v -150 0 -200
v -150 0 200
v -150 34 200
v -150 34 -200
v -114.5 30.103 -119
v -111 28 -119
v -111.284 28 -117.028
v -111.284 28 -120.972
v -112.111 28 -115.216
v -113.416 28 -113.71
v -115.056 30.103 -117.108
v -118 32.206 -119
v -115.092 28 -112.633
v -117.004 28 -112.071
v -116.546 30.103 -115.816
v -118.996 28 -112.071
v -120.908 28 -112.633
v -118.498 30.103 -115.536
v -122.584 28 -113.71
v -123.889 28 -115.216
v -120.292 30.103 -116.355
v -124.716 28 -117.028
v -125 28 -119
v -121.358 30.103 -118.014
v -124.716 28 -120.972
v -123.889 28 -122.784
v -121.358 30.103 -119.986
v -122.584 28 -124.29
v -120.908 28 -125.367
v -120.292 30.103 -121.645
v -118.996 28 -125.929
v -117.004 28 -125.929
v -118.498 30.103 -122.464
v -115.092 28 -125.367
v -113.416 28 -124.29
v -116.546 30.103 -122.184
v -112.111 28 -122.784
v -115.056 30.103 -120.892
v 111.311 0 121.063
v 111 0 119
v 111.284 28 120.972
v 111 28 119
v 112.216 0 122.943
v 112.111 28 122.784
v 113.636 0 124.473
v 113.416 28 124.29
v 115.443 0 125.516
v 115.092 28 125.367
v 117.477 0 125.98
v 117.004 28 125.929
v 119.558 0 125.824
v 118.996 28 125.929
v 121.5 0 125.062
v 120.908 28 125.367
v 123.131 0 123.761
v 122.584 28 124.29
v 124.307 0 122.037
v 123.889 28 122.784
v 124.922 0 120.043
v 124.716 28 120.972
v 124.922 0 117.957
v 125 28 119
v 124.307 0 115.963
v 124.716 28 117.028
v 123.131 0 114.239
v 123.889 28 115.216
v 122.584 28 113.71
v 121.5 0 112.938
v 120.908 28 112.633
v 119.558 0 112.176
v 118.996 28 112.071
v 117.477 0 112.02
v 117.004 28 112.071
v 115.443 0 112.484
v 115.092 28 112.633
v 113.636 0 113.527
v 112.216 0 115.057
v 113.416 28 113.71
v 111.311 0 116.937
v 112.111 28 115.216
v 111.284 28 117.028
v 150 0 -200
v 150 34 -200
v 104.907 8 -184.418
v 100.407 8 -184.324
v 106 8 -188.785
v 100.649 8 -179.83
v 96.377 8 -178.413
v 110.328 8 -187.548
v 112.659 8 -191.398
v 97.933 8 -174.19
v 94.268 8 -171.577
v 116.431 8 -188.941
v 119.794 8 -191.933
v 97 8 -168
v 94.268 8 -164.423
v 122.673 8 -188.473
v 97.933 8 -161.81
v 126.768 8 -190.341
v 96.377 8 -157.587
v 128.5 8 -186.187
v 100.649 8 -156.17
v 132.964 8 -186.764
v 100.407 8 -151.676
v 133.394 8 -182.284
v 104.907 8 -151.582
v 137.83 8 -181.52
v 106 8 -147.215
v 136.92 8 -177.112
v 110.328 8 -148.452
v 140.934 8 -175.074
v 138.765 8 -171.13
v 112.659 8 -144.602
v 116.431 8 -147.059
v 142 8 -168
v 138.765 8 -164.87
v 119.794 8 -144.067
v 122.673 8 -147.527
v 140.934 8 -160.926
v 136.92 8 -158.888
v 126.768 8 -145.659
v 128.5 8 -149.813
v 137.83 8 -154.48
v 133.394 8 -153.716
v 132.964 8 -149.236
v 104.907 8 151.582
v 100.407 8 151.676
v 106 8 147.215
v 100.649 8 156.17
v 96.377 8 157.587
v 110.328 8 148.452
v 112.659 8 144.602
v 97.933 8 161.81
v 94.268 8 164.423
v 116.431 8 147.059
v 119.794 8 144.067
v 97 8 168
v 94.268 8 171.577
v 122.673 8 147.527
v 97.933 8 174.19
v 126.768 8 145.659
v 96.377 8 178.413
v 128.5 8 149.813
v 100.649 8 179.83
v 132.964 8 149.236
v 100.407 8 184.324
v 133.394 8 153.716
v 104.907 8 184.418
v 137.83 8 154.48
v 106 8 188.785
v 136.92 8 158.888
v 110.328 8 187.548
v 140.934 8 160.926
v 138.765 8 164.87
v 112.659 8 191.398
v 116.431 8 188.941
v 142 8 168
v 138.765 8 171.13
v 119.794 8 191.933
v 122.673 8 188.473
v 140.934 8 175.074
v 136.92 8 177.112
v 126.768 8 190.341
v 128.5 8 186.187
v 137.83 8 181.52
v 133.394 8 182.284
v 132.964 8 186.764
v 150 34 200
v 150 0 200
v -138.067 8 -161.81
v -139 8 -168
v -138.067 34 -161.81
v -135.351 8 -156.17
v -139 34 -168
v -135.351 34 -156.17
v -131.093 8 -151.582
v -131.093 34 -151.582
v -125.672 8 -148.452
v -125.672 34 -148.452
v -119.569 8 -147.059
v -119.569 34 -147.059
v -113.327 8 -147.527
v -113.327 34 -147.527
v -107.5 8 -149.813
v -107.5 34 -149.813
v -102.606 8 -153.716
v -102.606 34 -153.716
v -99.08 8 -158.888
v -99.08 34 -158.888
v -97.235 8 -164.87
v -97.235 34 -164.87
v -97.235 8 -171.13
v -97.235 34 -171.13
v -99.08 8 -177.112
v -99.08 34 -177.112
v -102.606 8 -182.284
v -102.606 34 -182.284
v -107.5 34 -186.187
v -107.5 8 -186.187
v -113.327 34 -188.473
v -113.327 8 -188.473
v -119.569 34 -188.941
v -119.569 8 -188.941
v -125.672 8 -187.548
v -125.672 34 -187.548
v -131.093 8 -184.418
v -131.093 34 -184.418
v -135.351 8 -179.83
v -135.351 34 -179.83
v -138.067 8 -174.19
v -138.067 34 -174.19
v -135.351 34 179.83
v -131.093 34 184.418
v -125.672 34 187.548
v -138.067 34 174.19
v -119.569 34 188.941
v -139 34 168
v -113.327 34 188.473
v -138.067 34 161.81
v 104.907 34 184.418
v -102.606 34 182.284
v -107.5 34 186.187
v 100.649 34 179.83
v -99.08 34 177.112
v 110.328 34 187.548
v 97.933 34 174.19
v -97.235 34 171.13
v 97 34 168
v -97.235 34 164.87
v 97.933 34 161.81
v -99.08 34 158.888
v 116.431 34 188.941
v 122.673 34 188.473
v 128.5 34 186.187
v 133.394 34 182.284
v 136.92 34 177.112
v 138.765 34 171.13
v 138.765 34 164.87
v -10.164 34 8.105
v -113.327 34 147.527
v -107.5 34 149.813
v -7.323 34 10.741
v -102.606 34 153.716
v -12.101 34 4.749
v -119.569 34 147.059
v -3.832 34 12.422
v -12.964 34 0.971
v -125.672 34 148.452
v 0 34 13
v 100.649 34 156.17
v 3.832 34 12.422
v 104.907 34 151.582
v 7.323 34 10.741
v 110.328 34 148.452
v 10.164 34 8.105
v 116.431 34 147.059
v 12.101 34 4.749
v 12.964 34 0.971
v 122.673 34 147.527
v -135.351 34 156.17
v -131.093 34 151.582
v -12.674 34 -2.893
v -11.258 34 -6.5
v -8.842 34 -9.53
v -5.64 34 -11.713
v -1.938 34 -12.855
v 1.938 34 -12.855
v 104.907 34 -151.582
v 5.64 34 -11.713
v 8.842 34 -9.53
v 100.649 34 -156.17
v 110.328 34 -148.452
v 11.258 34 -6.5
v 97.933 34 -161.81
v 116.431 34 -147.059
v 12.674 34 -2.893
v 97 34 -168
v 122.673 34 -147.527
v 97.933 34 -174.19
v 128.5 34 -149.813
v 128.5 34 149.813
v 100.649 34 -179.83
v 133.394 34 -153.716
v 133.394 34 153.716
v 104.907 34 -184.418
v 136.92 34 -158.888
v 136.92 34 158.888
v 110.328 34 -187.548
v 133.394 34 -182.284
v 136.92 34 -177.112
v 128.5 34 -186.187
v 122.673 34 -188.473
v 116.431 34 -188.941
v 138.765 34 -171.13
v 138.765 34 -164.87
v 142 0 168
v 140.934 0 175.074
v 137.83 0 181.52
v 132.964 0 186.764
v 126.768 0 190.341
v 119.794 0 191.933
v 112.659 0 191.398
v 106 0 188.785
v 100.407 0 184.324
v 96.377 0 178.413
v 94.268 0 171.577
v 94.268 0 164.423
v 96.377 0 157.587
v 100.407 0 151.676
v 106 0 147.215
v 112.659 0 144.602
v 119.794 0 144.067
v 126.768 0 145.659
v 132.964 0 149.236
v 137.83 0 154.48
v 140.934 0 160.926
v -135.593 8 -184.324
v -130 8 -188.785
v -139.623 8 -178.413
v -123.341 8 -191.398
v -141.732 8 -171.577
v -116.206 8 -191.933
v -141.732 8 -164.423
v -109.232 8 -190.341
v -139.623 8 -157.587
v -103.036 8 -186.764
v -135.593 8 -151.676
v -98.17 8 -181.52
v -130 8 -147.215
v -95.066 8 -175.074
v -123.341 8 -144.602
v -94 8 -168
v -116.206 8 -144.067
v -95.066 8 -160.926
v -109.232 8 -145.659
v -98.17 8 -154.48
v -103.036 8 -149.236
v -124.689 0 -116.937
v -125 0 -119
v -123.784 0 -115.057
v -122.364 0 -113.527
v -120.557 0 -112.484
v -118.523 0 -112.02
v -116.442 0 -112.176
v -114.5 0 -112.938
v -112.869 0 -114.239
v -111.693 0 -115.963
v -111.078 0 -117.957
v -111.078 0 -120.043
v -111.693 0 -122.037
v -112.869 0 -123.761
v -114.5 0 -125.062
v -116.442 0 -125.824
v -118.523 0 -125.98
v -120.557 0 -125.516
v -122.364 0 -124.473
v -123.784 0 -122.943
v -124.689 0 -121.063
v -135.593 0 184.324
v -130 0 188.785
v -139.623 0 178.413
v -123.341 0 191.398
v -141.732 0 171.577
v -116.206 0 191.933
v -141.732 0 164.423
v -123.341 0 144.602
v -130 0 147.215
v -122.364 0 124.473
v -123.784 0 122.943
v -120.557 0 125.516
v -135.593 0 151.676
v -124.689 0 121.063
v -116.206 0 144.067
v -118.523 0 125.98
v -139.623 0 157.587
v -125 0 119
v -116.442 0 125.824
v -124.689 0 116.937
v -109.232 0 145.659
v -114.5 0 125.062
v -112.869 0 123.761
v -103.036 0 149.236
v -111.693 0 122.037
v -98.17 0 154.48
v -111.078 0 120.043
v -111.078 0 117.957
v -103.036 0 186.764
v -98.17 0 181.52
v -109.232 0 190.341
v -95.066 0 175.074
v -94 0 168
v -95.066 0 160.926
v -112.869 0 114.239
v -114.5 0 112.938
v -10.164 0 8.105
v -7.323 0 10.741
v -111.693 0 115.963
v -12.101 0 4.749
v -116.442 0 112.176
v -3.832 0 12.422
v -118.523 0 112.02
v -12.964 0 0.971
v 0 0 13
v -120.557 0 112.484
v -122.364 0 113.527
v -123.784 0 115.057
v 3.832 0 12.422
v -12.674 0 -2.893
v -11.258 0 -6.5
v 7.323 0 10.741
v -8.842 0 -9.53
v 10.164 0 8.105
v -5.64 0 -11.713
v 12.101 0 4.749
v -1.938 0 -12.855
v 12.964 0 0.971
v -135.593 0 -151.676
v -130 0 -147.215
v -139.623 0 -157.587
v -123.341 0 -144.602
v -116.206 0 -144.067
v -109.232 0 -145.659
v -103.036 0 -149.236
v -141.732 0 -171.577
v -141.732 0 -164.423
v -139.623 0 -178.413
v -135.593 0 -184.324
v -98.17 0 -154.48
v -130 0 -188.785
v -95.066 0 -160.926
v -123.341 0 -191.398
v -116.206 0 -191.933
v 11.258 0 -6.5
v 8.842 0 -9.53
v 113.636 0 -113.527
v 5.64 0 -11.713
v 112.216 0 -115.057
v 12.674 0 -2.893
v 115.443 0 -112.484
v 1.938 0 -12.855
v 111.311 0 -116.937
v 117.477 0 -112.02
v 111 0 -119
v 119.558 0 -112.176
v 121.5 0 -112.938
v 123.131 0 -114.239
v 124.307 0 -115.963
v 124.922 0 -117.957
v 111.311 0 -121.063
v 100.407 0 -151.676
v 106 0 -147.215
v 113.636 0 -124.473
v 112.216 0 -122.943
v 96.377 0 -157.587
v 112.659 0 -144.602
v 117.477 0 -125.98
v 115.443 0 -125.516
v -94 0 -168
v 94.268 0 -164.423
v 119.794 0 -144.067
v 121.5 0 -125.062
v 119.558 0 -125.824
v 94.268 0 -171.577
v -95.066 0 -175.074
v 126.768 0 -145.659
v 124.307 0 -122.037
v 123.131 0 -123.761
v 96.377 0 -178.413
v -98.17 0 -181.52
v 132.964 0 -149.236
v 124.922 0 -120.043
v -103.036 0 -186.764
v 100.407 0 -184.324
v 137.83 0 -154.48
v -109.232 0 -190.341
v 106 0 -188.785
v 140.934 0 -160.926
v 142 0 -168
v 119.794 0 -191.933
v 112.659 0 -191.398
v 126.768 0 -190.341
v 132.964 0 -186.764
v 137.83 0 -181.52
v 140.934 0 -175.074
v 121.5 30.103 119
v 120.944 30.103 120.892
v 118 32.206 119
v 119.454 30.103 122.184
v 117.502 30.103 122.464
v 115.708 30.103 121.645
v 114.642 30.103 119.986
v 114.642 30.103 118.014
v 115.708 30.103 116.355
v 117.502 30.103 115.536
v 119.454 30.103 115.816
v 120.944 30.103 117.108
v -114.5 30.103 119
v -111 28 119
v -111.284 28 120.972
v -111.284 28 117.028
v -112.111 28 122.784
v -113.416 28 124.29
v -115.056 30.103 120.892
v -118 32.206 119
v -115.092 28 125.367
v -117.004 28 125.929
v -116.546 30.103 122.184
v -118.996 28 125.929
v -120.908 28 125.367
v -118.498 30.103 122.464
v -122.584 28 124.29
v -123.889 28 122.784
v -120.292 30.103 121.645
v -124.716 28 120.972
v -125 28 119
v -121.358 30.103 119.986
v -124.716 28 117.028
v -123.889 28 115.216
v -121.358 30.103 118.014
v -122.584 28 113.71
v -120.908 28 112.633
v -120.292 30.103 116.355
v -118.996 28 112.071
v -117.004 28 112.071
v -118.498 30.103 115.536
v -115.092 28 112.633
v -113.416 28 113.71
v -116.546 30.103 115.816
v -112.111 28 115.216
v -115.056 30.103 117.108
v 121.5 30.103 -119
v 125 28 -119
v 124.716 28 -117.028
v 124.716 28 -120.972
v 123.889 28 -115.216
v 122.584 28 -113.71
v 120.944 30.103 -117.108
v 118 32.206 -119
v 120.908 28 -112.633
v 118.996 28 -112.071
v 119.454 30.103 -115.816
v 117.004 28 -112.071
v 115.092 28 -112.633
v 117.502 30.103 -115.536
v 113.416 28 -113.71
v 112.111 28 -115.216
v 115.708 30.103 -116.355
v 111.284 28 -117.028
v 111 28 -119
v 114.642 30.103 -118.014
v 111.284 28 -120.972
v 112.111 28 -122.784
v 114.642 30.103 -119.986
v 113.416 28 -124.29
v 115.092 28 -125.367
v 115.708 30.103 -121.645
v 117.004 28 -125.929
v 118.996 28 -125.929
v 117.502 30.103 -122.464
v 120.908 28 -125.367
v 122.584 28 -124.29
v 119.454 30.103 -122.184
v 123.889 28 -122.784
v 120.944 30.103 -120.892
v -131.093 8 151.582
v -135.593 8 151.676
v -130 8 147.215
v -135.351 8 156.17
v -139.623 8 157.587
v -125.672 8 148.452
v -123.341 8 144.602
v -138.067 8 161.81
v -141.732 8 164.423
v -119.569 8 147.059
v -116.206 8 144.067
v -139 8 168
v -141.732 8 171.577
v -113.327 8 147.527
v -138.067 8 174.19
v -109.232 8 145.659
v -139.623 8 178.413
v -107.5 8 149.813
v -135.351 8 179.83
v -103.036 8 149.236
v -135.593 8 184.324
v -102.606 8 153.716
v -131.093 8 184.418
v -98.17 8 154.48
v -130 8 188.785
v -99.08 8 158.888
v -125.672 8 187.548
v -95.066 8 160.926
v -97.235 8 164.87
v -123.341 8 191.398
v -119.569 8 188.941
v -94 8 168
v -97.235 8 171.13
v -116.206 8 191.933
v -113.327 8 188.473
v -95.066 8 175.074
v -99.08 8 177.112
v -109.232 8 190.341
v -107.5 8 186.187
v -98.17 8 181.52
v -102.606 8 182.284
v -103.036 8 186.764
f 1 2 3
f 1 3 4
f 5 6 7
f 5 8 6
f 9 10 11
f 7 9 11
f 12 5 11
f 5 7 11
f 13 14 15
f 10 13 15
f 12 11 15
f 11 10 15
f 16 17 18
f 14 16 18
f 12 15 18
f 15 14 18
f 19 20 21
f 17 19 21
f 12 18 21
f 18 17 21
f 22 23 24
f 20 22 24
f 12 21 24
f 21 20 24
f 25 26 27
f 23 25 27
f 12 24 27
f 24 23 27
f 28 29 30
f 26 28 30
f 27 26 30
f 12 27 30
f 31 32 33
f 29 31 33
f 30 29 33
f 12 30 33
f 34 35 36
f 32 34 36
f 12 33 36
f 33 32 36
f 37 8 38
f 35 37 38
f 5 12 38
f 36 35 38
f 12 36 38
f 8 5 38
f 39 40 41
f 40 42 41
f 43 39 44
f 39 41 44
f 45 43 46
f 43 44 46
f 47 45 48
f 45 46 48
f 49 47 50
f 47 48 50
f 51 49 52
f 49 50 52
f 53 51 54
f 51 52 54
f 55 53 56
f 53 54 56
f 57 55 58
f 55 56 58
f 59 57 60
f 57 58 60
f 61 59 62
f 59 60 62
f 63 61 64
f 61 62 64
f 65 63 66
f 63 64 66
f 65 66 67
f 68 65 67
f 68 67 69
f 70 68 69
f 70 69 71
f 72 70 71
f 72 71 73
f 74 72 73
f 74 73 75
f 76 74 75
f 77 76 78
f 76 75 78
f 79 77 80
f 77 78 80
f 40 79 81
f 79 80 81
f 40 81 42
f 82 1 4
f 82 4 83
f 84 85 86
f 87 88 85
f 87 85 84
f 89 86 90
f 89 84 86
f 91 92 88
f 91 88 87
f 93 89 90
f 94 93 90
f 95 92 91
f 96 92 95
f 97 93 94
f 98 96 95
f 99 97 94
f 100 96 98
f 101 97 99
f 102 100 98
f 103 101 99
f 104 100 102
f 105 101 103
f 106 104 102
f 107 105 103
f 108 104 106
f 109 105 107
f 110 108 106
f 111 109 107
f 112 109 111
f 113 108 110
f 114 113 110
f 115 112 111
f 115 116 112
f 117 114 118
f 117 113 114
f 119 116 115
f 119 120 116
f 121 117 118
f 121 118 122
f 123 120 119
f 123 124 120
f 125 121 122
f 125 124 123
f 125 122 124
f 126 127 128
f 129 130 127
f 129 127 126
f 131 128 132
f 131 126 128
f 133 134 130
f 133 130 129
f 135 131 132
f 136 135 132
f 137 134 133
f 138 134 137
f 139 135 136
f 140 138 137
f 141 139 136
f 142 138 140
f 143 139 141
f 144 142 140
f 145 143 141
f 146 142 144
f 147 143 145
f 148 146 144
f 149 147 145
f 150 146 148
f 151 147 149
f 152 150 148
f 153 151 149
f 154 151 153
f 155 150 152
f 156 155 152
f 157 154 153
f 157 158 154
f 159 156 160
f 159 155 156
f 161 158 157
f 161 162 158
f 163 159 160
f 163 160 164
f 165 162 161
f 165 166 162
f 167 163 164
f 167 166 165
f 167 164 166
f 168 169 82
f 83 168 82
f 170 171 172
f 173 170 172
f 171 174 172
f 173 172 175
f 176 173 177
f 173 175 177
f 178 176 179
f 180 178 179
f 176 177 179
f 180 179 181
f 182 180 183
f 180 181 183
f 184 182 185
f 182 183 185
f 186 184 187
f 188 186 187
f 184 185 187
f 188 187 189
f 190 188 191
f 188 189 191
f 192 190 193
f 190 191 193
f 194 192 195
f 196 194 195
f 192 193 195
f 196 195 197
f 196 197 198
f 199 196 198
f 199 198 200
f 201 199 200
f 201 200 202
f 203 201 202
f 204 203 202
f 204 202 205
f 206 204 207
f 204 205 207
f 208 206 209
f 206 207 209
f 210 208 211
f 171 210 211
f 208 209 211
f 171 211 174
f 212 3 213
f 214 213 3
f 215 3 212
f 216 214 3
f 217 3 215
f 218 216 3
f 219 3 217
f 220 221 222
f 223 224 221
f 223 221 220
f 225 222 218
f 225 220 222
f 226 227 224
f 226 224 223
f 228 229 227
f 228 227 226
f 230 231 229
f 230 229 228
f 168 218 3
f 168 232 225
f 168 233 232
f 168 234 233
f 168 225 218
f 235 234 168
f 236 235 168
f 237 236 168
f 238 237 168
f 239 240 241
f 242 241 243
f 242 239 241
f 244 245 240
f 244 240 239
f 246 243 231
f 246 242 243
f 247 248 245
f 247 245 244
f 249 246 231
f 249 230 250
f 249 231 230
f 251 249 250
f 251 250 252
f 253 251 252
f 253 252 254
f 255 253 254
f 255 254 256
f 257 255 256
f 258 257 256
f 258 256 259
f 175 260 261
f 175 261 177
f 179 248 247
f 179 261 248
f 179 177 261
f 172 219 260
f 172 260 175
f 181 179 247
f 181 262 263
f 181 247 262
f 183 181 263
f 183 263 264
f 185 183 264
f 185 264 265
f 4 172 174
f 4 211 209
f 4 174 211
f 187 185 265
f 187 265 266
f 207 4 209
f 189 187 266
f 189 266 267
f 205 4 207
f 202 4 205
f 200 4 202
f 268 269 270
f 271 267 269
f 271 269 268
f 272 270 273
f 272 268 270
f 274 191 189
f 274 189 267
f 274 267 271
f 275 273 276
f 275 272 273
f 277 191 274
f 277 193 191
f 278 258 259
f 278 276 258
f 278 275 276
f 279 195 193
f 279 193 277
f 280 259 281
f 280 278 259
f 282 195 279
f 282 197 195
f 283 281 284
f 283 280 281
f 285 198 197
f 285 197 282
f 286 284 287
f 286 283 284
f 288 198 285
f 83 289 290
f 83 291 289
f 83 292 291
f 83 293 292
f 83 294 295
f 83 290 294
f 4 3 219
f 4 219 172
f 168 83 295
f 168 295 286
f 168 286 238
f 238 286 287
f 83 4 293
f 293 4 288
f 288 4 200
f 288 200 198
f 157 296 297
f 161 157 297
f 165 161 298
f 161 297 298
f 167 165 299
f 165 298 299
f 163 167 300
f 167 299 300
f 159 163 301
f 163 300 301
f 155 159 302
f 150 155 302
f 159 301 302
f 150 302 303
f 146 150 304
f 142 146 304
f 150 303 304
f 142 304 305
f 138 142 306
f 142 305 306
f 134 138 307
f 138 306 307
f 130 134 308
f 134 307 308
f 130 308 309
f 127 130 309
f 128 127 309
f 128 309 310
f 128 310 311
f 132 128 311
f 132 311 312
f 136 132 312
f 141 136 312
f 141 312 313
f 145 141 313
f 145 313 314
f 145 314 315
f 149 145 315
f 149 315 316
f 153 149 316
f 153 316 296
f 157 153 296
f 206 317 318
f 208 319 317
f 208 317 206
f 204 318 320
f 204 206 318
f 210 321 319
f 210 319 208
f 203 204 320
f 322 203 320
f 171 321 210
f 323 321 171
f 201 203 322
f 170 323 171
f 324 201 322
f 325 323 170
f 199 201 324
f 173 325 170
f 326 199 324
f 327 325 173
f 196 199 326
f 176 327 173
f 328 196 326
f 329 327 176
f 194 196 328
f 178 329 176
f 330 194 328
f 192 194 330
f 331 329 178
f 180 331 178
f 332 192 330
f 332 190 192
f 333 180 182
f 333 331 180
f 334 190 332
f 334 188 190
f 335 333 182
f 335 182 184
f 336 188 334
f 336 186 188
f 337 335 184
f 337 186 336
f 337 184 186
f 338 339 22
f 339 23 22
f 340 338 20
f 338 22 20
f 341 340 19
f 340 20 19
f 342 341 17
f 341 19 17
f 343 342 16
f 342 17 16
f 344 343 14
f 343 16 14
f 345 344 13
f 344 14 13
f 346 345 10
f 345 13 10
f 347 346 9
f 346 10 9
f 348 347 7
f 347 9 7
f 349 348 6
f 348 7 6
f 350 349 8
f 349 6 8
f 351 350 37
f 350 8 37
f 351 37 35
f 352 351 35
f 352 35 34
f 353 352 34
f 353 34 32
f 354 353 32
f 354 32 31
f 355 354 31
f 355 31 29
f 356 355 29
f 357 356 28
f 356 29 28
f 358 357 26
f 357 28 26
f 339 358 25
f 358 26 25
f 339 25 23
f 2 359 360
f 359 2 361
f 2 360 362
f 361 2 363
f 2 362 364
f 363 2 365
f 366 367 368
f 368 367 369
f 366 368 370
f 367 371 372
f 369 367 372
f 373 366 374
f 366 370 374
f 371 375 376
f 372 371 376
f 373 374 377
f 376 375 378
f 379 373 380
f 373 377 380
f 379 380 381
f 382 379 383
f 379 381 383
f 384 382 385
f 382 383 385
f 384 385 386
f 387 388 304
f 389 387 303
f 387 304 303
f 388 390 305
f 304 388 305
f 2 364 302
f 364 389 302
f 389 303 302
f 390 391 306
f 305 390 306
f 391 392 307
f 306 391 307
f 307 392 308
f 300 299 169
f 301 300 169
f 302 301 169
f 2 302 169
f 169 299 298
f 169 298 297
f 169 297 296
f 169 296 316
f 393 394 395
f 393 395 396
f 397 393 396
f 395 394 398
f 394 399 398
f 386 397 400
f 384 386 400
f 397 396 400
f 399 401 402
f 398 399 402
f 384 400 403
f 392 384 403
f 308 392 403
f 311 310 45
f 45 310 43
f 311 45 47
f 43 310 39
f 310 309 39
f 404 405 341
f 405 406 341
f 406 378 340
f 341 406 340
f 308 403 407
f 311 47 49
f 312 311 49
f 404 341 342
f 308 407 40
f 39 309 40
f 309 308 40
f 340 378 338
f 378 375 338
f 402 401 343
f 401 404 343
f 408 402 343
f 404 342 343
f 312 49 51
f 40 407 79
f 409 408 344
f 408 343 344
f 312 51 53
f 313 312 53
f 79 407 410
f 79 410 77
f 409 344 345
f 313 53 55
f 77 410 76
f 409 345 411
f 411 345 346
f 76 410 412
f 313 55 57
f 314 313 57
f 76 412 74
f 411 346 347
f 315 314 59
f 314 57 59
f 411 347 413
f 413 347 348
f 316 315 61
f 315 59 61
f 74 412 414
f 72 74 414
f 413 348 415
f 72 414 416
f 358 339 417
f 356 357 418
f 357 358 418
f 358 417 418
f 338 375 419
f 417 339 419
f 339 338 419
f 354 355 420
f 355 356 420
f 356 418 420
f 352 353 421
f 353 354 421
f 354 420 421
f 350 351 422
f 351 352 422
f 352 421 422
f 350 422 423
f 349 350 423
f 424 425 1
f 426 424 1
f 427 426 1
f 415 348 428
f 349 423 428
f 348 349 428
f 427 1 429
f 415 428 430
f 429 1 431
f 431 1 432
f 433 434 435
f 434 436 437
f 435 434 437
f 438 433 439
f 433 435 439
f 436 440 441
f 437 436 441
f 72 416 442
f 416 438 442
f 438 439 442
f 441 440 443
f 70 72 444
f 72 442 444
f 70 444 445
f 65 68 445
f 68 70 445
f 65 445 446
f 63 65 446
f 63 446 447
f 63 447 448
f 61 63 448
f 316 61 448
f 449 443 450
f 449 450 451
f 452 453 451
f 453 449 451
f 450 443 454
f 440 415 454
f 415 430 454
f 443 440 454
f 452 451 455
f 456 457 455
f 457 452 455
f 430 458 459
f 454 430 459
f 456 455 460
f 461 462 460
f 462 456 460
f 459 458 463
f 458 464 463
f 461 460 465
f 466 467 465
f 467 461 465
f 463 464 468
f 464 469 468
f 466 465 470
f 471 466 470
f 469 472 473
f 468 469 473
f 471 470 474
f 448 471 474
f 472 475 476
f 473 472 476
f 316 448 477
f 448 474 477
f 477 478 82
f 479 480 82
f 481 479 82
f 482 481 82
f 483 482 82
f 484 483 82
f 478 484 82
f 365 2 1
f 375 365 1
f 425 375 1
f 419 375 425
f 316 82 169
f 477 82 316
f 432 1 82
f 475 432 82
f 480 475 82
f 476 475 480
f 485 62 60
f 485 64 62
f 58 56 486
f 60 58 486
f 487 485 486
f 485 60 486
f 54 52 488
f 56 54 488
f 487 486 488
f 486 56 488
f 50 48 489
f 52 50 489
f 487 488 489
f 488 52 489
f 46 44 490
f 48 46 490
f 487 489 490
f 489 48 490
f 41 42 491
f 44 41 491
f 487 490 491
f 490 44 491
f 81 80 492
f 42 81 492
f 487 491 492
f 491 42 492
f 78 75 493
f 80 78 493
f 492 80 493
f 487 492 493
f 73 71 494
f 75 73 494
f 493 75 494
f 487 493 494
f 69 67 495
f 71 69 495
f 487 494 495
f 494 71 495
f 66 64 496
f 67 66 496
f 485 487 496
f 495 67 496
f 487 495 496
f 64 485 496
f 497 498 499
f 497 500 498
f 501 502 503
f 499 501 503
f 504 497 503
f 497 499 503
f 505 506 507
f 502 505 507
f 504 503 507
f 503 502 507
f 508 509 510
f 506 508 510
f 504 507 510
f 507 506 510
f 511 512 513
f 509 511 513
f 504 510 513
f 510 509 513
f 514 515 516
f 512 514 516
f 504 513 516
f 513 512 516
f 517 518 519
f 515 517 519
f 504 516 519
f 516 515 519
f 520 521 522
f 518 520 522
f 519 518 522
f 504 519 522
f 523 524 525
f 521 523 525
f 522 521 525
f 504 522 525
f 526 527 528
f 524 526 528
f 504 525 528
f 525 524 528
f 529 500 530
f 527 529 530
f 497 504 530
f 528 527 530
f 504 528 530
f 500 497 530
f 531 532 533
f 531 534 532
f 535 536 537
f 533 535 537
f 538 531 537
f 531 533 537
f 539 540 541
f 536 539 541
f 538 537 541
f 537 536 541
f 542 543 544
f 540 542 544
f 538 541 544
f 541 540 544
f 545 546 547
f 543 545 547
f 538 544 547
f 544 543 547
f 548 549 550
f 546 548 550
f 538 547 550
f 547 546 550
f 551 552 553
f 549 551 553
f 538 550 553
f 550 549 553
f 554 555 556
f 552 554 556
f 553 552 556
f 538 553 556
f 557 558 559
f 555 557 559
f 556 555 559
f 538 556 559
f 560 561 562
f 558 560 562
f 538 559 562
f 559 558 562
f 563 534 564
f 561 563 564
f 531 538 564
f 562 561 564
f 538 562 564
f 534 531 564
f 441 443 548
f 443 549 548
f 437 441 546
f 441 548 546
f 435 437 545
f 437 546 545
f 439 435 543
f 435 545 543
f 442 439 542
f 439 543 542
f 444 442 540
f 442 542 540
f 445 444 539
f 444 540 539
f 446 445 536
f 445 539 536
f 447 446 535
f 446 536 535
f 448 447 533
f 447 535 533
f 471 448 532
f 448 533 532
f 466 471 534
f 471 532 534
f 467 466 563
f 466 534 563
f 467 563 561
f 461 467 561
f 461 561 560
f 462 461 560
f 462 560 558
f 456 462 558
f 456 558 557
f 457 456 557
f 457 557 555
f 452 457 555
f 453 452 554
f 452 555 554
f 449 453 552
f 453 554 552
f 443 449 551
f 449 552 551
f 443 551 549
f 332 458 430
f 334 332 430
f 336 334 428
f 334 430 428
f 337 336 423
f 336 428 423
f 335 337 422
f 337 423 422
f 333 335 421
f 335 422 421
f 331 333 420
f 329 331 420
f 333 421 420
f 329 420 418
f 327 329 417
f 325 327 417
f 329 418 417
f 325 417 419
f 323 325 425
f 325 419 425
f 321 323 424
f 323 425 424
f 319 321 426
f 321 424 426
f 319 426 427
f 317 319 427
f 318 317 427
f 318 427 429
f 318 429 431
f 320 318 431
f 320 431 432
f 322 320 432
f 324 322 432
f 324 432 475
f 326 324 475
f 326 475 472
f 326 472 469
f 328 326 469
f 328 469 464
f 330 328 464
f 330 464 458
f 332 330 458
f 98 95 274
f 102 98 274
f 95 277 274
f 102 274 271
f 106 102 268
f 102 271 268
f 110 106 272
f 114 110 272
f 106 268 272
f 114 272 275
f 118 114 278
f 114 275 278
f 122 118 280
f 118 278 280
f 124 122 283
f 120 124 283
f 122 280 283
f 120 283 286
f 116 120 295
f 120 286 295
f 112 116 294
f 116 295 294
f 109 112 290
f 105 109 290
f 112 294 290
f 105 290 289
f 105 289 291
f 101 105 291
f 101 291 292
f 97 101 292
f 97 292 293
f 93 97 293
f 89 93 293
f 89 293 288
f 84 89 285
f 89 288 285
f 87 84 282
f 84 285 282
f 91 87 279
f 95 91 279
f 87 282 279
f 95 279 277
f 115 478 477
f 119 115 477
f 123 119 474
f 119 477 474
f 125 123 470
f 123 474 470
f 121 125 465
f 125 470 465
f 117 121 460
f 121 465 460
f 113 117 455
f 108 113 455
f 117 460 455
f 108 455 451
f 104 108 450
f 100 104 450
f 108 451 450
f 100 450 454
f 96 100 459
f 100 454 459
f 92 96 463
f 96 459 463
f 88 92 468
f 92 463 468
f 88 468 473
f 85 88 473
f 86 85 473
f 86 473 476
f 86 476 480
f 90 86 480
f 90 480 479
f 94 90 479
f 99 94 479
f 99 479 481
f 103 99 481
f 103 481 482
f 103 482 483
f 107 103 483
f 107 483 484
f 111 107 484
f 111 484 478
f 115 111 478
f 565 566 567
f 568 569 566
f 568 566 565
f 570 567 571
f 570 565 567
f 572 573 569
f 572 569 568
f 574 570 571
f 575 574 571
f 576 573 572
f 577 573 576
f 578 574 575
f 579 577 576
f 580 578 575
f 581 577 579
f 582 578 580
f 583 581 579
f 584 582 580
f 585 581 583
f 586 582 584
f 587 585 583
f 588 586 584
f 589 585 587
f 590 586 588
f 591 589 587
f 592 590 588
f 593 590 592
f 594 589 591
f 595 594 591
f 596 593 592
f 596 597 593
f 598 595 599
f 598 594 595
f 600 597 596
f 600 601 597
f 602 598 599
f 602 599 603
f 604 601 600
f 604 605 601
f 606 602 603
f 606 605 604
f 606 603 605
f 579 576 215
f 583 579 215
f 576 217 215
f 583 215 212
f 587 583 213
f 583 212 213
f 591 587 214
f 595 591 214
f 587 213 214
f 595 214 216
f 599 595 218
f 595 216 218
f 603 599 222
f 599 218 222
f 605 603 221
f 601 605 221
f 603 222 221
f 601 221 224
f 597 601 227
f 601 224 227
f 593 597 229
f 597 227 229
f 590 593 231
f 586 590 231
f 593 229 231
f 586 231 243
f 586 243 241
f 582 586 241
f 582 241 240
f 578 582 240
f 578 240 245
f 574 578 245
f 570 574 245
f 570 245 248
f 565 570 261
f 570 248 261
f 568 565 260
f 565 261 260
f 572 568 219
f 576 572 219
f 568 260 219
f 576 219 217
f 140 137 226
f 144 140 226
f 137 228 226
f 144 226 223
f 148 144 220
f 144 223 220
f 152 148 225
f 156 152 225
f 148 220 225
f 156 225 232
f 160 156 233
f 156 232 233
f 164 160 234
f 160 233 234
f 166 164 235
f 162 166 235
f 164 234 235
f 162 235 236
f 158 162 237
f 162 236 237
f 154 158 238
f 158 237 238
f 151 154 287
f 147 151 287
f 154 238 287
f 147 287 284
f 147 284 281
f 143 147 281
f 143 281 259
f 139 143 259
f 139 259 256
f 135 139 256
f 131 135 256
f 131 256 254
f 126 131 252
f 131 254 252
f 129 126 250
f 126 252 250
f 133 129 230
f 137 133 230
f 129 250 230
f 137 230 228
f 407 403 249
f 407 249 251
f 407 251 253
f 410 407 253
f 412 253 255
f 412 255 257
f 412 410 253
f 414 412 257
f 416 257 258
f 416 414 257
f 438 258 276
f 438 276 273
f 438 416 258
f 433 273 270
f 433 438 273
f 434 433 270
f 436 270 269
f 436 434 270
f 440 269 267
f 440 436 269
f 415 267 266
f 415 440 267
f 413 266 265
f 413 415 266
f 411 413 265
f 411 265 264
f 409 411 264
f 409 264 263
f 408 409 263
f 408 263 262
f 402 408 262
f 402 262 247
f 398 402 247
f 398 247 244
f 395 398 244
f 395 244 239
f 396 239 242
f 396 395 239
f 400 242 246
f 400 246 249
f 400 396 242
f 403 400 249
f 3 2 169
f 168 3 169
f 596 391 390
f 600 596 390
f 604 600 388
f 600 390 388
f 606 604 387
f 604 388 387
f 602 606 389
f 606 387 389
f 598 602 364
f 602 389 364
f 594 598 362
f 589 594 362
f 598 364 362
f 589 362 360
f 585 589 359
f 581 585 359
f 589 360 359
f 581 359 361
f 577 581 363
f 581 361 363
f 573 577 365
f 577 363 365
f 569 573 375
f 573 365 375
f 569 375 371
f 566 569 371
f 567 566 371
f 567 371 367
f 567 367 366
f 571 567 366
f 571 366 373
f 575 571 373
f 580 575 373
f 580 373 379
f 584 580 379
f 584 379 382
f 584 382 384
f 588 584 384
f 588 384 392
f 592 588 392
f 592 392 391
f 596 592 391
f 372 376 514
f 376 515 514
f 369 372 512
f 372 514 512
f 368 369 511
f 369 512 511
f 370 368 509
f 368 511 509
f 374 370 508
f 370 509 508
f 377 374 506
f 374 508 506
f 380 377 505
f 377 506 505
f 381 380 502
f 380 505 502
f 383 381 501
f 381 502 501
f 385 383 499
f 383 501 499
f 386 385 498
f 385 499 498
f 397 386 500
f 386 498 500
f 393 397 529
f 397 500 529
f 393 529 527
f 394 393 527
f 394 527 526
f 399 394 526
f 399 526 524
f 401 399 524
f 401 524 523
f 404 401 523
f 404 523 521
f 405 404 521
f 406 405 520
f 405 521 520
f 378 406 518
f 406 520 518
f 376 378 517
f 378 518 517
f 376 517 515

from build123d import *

# Parameters (mm, degrees)
ESBO_O1_W                  = 300
ESBO_O1_H                  = 400
ESBO_O1_R                  = 13
EXTRUS_O1_DEPTH            = 34
FURO_ROSCADO_DE_M161_D     = 14
FURO_ROSCADO_DE_M161_DEPTH = 28
FURO_ROSCADO_DE_M161_TIP   = 4.206024333
FURO1_D                    = 42
FURO1_CBORE_D              = 48
FURO1_CBORE_DEPTH          = 8


with BuildPart() as part:
    # Esboço1 → Extrusão1 (new body)
    with BuildSketch(Plane(origin=(0, 0, 0), x_dir=(1, 0, 0), z_dir=(0, 1, 0))):
        Rectangle(ESBO_O1_W, ESBO_O1_H)
        with Locations(Location((0, 0, 0), (0, 0, 270))):  # turned: the seam where the file's is
            Circle(ESBO_O1_R, mode=Mode.SUBTRACT)
    extrude(amount=EXTRUS_O1_DEPTH)

    # Furo roscado de M161
    with Locations(Plane.XZ):
        with Locations((-118, 119), (118, 119), (-118, -119), (118, -119)):
            Hole(FURO_ROSCADO_DE_M161_D / 2, depth=FURO_ROSCADO_DE_M161_DEPTH)
            with Locations((0, 0, -(FURO_ROSCADO_DE_M161_DEPTH + FURO_ROSCADO_DE_M161_TIP / 2))):  # 118° drill point
                Cone(0, FURO_ROSCADO_DE_M161_D / 2, FURO_ROSCADO_DE_M161_TIP, mode=Mode.SUBTRACT)

    # Furo1 (through all)
    with Locations(Plane.XZ):
        with Locations((118, 168), (118, -168), (-118, -168), (-118, 168)):
            CounterBoreHole(FURO1_D / 2, FURO1_CBORE_D / 2, FURO1_CBORE_DEPTH)


solid = part.part
